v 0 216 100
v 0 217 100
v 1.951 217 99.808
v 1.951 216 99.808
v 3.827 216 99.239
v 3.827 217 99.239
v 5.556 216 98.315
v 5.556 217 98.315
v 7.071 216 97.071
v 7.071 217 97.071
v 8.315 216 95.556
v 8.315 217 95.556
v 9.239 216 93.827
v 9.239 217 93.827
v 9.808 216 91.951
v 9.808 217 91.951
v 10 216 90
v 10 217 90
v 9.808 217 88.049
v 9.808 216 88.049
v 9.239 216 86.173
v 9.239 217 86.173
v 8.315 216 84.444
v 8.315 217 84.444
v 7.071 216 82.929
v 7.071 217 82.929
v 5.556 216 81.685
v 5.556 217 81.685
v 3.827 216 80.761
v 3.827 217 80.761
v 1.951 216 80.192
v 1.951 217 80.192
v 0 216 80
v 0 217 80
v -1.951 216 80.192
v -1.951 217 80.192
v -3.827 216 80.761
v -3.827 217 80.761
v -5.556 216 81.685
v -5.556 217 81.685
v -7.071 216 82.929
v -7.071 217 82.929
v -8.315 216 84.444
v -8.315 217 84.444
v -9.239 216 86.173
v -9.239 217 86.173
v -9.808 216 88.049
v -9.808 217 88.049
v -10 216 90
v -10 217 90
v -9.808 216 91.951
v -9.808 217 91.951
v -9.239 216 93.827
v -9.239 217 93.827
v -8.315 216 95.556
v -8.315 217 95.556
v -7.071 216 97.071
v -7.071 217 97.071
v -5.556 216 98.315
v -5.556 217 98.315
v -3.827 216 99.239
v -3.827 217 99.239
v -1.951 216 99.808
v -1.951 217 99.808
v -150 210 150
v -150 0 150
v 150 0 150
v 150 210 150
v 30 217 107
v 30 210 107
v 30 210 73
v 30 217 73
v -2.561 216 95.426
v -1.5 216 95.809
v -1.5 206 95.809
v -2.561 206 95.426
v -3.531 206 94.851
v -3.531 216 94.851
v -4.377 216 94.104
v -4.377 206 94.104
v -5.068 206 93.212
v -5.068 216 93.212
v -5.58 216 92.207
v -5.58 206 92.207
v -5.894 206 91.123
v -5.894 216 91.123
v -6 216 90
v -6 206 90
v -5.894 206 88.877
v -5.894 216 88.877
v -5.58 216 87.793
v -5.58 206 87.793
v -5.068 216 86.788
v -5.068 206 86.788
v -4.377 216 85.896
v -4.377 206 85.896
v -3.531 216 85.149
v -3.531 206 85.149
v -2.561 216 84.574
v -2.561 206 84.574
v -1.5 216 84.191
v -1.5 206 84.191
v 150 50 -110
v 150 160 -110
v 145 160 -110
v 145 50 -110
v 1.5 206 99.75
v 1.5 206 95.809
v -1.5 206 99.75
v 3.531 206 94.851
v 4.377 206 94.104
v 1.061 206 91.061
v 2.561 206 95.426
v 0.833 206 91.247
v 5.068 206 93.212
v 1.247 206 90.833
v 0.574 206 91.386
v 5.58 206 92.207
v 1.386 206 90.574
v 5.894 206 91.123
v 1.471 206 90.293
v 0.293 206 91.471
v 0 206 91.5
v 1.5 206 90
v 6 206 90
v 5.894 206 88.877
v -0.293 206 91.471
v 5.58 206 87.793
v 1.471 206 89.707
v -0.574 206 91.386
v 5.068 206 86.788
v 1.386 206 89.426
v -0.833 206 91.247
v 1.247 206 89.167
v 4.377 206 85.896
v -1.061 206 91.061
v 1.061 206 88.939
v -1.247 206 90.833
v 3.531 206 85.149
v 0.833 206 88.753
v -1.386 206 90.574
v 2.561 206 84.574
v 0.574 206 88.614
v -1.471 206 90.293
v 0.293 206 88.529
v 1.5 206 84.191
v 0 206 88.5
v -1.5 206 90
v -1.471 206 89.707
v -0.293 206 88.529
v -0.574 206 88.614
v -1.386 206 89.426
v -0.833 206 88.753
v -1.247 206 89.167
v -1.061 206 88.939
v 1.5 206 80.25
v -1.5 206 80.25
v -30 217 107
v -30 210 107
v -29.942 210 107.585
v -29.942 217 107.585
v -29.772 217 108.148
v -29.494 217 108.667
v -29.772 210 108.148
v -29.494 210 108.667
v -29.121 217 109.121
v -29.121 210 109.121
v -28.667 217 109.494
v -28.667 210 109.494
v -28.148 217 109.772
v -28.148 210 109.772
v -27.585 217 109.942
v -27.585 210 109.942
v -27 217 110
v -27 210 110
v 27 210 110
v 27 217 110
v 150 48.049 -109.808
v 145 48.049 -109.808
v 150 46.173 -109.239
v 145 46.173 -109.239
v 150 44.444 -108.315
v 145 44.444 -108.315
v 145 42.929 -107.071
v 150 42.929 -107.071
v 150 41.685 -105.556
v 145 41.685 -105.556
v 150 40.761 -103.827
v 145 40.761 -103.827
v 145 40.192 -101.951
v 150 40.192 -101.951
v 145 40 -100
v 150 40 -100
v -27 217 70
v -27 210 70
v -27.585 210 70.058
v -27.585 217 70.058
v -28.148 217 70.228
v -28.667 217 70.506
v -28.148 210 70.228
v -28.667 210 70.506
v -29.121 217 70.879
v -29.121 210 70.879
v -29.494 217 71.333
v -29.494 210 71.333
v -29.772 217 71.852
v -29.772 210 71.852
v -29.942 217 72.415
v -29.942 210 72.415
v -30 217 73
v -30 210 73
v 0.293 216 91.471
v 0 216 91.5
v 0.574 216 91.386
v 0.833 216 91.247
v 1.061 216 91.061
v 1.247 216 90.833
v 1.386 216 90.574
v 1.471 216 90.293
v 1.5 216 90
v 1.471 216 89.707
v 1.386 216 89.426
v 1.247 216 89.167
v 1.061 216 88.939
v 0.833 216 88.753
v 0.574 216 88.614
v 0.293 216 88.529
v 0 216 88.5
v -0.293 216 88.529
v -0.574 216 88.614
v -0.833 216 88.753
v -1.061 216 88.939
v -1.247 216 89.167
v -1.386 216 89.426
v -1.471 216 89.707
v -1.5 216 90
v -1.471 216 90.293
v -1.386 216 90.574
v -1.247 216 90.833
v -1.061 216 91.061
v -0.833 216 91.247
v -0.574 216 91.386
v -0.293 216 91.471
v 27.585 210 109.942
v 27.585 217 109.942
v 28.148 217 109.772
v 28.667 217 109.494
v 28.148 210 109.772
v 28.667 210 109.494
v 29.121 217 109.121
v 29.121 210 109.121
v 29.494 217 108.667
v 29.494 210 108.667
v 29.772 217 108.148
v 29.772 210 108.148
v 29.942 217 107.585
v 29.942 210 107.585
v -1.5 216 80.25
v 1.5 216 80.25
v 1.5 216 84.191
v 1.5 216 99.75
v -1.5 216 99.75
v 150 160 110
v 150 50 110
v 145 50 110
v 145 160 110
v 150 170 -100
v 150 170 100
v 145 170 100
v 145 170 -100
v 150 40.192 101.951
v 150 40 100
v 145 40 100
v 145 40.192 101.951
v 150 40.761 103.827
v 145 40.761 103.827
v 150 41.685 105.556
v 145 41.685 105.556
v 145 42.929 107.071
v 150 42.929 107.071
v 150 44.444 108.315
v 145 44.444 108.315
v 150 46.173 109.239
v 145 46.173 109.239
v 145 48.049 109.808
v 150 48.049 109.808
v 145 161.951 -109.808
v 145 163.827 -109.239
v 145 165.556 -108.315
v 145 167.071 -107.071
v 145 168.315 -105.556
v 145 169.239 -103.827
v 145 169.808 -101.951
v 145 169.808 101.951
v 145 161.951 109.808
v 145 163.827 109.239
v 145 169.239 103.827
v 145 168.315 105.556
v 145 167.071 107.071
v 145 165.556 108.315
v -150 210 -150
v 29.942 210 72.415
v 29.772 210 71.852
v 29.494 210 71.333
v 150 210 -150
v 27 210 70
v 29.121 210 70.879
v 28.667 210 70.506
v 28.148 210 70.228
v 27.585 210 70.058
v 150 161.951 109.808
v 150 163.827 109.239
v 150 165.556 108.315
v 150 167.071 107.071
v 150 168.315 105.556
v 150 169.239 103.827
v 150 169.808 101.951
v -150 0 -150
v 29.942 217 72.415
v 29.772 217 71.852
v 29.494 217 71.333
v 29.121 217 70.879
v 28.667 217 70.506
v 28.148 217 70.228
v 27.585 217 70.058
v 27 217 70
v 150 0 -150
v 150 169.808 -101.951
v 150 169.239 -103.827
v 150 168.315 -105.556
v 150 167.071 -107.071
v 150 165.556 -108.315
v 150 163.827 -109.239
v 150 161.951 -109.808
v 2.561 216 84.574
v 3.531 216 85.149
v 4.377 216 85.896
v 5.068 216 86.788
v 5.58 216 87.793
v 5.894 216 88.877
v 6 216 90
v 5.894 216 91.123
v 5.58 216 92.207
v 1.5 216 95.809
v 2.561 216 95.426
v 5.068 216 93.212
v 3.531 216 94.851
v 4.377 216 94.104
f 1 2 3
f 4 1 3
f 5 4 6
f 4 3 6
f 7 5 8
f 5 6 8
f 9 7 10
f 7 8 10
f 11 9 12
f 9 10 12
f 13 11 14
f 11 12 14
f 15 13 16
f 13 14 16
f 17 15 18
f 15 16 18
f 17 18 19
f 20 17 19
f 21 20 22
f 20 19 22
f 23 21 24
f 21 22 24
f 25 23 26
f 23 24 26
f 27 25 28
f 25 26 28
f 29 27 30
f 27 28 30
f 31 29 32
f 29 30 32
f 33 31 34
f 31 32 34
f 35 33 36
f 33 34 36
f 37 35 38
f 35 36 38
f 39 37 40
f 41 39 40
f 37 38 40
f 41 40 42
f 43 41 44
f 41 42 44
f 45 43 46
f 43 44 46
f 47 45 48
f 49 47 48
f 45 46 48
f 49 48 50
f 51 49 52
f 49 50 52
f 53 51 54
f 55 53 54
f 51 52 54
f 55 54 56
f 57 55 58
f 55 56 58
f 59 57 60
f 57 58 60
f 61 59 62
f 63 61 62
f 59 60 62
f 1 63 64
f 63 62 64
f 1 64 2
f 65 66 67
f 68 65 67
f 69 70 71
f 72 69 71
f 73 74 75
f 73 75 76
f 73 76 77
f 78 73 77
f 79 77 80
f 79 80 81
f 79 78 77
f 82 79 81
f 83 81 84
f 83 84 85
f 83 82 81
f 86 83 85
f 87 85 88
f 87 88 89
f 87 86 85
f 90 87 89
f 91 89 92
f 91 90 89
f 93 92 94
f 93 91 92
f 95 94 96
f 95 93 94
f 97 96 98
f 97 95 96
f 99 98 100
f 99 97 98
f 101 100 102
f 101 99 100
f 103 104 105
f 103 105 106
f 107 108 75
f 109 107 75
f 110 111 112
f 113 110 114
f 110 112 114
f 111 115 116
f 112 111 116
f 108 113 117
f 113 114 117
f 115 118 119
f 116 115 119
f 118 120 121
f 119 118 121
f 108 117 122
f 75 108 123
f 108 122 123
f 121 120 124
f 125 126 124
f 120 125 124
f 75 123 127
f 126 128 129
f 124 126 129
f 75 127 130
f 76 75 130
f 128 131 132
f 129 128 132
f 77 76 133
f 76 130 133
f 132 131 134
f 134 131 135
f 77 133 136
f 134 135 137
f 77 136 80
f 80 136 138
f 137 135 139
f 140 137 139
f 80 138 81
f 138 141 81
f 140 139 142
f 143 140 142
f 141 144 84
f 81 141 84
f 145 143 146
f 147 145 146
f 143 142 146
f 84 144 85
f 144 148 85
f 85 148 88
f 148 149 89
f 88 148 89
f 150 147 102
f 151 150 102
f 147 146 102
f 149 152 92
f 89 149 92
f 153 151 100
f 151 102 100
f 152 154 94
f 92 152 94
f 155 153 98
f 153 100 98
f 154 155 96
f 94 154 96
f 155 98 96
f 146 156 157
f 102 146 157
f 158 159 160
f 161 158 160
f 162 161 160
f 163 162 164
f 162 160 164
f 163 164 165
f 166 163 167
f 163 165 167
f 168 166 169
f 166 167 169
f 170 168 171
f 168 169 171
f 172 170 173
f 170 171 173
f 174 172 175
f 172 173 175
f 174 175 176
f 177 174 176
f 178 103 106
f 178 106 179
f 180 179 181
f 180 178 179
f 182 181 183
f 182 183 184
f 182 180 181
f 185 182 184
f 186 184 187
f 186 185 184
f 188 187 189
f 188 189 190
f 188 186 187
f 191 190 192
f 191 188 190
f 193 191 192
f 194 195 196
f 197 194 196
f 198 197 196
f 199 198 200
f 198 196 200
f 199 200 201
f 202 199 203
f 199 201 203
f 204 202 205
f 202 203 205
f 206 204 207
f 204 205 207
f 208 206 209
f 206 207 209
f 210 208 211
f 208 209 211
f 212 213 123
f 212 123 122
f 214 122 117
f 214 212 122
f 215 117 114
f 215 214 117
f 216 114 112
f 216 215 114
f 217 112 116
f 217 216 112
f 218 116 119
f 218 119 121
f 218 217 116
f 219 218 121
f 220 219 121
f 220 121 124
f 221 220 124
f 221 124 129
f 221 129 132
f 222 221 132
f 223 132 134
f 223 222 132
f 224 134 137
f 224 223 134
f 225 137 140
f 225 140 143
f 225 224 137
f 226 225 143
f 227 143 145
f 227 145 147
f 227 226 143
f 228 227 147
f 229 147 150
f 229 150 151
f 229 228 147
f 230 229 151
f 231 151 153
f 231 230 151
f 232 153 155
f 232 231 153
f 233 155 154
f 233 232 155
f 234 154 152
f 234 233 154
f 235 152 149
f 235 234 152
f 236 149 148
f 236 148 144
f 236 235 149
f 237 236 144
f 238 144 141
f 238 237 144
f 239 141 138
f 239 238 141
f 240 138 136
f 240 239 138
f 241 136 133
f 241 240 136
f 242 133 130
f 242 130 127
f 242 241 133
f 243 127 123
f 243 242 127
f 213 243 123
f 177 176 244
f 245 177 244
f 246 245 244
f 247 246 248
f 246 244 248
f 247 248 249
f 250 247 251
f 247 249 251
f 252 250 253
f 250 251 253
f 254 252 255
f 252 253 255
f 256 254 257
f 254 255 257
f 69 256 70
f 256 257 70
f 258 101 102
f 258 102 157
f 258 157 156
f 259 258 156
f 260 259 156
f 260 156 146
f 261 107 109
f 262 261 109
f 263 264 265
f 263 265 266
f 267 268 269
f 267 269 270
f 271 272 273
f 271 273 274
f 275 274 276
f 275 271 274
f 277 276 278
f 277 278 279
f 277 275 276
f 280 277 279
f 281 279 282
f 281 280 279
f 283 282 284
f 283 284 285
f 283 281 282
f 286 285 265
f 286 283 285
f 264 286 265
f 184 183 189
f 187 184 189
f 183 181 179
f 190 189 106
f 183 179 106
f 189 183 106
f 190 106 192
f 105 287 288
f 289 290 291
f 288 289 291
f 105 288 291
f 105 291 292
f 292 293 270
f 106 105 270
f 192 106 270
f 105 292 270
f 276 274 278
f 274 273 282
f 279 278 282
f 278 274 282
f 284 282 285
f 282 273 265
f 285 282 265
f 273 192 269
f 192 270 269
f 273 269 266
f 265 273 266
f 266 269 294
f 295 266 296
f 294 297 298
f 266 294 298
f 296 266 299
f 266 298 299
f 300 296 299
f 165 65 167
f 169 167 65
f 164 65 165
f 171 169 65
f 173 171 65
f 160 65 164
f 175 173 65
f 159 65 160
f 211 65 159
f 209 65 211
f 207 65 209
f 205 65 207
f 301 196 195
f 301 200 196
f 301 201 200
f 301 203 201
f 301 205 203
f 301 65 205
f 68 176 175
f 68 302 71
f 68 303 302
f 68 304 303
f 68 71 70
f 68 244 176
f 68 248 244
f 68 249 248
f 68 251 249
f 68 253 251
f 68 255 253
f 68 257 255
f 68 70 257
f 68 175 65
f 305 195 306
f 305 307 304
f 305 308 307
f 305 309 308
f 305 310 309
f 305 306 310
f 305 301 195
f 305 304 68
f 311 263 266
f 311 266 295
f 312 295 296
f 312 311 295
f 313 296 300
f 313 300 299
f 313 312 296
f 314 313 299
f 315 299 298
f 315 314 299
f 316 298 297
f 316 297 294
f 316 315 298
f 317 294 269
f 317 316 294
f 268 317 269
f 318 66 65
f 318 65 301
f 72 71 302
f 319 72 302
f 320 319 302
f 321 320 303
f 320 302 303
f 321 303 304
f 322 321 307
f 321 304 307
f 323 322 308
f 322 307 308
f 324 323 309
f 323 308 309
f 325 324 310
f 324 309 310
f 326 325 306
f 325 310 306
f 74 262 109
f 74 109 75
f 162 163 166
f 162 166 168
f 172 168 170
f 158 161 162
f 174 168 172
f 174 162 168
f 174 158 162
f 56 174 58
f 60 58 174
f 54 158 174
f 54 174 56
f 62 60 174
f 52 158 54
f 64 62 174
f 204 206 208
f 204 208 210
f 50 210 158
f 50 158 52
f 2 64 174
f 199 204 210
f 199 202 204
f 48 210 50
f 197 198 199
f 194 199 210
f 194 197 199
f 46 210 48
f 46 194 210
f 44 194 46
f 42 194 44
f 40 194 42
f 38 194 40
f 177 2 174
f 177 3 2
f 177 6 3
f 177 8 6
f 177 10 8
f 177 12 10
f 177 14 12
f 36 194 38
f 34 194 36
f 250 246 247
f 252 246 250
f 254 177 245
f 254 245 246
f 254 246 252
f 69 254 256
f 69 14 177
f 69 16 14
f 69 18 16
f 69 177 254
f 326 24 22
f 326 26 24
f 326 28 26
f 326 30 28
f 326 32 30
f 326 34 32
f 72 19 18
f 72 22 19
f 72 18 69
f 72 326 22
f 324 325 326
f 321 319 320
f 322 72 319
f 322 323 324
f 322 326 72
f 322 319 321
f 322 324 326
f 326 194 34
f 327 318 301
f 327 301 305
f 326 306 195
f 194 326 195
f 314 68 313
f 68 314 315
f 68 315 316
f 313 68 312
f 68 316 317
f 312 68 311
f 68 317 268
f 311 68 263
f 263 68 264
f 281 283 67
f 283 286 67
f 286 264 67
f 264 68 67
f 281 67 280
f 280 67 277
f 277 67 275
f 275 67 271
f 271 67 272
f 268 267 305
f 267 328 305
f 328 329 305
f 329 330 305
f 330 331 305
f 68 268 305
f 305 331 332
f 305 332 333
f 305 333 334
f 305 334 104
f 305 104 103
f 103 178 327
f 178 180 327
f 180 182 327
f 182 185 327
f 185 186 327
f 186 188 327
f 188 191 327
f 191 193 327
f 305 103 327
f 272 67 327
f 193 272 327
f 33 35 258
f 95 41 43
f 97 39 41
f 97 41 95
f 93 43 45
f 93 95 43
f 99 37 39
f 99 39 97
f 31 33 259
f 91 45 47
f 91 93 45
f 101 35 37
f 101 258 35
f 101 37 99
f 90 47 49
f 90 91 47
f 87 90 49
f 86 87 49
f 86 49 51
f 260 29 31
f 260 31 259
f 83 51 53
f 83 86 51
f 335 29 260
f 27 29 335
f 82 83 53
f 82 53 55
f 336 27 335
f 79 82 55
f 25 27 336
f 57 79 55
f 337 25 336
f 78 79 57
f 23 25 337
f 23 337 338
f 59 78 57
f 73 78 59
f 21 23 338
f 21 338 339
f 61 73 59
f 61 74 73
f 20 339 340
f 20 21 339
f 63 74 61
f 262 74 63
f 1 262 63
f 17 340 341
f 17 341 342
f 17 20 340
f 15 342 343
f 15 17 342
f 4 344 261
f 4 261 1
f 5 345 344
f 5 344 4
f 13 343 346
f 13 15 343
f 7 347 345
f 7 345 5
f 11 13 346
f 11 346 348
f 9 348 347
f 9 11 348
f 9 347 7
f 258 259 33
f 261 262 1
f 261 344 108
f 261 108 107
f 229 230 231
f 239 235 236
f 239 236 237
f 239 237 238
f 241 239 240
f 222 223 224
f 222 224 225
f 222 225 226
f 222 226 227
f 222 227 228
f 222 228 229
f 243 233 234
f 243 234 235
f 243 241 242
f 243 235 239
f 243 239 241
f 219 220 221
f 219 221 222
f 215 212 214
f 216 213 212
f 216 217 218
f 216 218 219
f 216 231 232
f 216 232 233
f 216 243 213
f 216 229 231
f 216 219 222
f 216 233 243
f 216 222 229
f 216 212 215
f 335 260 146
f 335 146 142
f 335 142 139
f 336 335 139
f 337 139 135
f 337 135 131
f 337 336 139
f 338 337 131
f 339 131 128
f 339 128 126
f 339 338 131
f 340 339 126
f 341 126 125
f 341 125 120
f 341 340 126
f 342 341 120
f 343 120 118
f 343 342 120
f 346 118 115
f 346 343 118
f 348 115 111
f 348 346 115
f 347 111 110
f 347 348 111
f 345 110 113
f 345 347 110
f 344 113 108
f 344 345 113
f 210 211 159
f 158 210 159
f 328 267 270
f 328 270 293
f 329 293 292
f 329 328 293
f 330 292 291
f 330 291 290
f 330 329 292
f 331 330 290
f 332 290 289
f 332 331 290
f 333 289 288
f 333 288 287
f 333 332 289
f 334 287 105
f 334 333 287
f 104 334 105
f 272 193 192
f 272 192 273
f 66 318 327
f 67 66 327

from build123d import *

# Parameters (mm, degrees)
SKETCH1_W           = 300
SKETCH1_H           = 300
BOSS_EXTRUDE1_DEPTH = 210
CUT_EXTRUDE1_DEPTH  = 5
BOSS_EXTRUDE2_DEPTH = 7
SKETCH4_R           = 10
CUT_EXTRUDE2_DEPTH  = 1
SKETCH5_R           = 1.5
CUT_EXTRUDE3_DEPTH  = 10


with BuildPart() as part:
    # Sketch1 → Boss-Extrude1 (new body)
    with BuildSketch(Plane(origin=(0, 0, 0), x_dir=(1, 0, 0), z_dir=(0, 1, 0))):
        Rectangle(SKETCH1_W, SKETCH1_H)
    extrude(amount=BOSS_EXTRUDE1_DEPTH)

    # Sketch2 → Cut-Extrude1 (cut)
    with BuildSketch(Plane(origin=(150, 0, 0), x_dir=(0, 0, -1), z_dir=(1, 0, 0))):
        with BuildLine():
            Line((-100, 170), (100, 170))
            ThreePointArc((100, 170), (107.071067812, 167.071067812), (110, 160))
            Line((110, 160), (110, 50))
            ThreePointArc((110, 50), (107.071067812, 42.928932188), (100, 40))
            Line((100, 40), (-100, 40))
            ThreePointArc((-100, 40), (-107.071067812, 42.928932188), (-110, 50))
            Line((-110, 50), (-110, 160))
            ThreePointArc((-110, 160), (-107.071067812, 167.071067812), (-100, 170))
        make_face()
    extrude(amount=-CUT_EXTRUDE1_DEPTH, mode=Mode.SUBTRACT)

    # Sketch3 → Boss-Extrude2 (add)
    with BuildSketch(Plane(origin=(0, 210, 0), x_dir=(1, 0, 0), z_dir=(0, 1, 0))):
        with BuildLine():
            Line((-27, -110), (27, -110))
            ThreePointArc((27, -110), (29.121320344, -109.121320344), (30, -107))
            Line((30, -107), (30, -73))
            ThreePointArc((30, -73), (29.121320344, -70.878679656), (27, -70))
            Line((27, -70), (-27, -70))
            ThreePointArc((-27, -70), (-29.121320344, -70.878679656), (-30, -73))
            Line((-30, -73), (-30, -107))
            ThreePointArc((-30, -107), (-29.121320344, -109.121320344), (-27, -110))
        make_face()
    extrude(amount=BOSS_EXTRUDE2_DEPTH)

    # Sketch4 → Cut-Extrude2 (cut)
    with BuildSketch(Plane(origin=(0, 217, 0), x_dir=(1, 0, 0), z_dir=(0, 1, 0))):
        with Locations(Location((0, -90, 0), (0, 0, 270))):
            Circle(SKETCH4_R)
    extrude(amount=-CUT_EXTRUDE2_DEPTH, mode=Mode.SUBTRACT)

    # Sketch5 → Cut-Extrude3 (cut)
    with BuildSketch(Plane(origin=(0, 216, 0), x_dir=(1, 0, 0), z_dir=(0, 1, 0))):
        with BuildLine():
            Line((-1.5, -84.190524981), (-1.5, -80.25))
            Line((-1.5, -80.25), (1.5, -80.25))
            Line((1.5, -80.25), (1.5, -84.190524981))
            ThreePointArc((1.5, -84.190524981), (6, -90), (1.5, -95.809475019))
            Line((1.5, -95.809475019), (1.5, -99.75))
            Line((1.5, -99.75), (-1.5, -99.75))
            Line((-1.5, -99.75), (-1.5, -95.809475019))
            ThreePointArc((-1.5, -95.809475019), (-6, -90), (-1.5, -84.190524981))
        make_face()
        with Locations(Location((0, -90, 0), (0, 0, 270))):
            Circle(SKETCH5_R, mode=Mode.SUBTRACT)
    extrude(amount=-CUT_EXTRUDE3_DEPTH, mode=Mode.SUBTRACT)


solid = part.part
